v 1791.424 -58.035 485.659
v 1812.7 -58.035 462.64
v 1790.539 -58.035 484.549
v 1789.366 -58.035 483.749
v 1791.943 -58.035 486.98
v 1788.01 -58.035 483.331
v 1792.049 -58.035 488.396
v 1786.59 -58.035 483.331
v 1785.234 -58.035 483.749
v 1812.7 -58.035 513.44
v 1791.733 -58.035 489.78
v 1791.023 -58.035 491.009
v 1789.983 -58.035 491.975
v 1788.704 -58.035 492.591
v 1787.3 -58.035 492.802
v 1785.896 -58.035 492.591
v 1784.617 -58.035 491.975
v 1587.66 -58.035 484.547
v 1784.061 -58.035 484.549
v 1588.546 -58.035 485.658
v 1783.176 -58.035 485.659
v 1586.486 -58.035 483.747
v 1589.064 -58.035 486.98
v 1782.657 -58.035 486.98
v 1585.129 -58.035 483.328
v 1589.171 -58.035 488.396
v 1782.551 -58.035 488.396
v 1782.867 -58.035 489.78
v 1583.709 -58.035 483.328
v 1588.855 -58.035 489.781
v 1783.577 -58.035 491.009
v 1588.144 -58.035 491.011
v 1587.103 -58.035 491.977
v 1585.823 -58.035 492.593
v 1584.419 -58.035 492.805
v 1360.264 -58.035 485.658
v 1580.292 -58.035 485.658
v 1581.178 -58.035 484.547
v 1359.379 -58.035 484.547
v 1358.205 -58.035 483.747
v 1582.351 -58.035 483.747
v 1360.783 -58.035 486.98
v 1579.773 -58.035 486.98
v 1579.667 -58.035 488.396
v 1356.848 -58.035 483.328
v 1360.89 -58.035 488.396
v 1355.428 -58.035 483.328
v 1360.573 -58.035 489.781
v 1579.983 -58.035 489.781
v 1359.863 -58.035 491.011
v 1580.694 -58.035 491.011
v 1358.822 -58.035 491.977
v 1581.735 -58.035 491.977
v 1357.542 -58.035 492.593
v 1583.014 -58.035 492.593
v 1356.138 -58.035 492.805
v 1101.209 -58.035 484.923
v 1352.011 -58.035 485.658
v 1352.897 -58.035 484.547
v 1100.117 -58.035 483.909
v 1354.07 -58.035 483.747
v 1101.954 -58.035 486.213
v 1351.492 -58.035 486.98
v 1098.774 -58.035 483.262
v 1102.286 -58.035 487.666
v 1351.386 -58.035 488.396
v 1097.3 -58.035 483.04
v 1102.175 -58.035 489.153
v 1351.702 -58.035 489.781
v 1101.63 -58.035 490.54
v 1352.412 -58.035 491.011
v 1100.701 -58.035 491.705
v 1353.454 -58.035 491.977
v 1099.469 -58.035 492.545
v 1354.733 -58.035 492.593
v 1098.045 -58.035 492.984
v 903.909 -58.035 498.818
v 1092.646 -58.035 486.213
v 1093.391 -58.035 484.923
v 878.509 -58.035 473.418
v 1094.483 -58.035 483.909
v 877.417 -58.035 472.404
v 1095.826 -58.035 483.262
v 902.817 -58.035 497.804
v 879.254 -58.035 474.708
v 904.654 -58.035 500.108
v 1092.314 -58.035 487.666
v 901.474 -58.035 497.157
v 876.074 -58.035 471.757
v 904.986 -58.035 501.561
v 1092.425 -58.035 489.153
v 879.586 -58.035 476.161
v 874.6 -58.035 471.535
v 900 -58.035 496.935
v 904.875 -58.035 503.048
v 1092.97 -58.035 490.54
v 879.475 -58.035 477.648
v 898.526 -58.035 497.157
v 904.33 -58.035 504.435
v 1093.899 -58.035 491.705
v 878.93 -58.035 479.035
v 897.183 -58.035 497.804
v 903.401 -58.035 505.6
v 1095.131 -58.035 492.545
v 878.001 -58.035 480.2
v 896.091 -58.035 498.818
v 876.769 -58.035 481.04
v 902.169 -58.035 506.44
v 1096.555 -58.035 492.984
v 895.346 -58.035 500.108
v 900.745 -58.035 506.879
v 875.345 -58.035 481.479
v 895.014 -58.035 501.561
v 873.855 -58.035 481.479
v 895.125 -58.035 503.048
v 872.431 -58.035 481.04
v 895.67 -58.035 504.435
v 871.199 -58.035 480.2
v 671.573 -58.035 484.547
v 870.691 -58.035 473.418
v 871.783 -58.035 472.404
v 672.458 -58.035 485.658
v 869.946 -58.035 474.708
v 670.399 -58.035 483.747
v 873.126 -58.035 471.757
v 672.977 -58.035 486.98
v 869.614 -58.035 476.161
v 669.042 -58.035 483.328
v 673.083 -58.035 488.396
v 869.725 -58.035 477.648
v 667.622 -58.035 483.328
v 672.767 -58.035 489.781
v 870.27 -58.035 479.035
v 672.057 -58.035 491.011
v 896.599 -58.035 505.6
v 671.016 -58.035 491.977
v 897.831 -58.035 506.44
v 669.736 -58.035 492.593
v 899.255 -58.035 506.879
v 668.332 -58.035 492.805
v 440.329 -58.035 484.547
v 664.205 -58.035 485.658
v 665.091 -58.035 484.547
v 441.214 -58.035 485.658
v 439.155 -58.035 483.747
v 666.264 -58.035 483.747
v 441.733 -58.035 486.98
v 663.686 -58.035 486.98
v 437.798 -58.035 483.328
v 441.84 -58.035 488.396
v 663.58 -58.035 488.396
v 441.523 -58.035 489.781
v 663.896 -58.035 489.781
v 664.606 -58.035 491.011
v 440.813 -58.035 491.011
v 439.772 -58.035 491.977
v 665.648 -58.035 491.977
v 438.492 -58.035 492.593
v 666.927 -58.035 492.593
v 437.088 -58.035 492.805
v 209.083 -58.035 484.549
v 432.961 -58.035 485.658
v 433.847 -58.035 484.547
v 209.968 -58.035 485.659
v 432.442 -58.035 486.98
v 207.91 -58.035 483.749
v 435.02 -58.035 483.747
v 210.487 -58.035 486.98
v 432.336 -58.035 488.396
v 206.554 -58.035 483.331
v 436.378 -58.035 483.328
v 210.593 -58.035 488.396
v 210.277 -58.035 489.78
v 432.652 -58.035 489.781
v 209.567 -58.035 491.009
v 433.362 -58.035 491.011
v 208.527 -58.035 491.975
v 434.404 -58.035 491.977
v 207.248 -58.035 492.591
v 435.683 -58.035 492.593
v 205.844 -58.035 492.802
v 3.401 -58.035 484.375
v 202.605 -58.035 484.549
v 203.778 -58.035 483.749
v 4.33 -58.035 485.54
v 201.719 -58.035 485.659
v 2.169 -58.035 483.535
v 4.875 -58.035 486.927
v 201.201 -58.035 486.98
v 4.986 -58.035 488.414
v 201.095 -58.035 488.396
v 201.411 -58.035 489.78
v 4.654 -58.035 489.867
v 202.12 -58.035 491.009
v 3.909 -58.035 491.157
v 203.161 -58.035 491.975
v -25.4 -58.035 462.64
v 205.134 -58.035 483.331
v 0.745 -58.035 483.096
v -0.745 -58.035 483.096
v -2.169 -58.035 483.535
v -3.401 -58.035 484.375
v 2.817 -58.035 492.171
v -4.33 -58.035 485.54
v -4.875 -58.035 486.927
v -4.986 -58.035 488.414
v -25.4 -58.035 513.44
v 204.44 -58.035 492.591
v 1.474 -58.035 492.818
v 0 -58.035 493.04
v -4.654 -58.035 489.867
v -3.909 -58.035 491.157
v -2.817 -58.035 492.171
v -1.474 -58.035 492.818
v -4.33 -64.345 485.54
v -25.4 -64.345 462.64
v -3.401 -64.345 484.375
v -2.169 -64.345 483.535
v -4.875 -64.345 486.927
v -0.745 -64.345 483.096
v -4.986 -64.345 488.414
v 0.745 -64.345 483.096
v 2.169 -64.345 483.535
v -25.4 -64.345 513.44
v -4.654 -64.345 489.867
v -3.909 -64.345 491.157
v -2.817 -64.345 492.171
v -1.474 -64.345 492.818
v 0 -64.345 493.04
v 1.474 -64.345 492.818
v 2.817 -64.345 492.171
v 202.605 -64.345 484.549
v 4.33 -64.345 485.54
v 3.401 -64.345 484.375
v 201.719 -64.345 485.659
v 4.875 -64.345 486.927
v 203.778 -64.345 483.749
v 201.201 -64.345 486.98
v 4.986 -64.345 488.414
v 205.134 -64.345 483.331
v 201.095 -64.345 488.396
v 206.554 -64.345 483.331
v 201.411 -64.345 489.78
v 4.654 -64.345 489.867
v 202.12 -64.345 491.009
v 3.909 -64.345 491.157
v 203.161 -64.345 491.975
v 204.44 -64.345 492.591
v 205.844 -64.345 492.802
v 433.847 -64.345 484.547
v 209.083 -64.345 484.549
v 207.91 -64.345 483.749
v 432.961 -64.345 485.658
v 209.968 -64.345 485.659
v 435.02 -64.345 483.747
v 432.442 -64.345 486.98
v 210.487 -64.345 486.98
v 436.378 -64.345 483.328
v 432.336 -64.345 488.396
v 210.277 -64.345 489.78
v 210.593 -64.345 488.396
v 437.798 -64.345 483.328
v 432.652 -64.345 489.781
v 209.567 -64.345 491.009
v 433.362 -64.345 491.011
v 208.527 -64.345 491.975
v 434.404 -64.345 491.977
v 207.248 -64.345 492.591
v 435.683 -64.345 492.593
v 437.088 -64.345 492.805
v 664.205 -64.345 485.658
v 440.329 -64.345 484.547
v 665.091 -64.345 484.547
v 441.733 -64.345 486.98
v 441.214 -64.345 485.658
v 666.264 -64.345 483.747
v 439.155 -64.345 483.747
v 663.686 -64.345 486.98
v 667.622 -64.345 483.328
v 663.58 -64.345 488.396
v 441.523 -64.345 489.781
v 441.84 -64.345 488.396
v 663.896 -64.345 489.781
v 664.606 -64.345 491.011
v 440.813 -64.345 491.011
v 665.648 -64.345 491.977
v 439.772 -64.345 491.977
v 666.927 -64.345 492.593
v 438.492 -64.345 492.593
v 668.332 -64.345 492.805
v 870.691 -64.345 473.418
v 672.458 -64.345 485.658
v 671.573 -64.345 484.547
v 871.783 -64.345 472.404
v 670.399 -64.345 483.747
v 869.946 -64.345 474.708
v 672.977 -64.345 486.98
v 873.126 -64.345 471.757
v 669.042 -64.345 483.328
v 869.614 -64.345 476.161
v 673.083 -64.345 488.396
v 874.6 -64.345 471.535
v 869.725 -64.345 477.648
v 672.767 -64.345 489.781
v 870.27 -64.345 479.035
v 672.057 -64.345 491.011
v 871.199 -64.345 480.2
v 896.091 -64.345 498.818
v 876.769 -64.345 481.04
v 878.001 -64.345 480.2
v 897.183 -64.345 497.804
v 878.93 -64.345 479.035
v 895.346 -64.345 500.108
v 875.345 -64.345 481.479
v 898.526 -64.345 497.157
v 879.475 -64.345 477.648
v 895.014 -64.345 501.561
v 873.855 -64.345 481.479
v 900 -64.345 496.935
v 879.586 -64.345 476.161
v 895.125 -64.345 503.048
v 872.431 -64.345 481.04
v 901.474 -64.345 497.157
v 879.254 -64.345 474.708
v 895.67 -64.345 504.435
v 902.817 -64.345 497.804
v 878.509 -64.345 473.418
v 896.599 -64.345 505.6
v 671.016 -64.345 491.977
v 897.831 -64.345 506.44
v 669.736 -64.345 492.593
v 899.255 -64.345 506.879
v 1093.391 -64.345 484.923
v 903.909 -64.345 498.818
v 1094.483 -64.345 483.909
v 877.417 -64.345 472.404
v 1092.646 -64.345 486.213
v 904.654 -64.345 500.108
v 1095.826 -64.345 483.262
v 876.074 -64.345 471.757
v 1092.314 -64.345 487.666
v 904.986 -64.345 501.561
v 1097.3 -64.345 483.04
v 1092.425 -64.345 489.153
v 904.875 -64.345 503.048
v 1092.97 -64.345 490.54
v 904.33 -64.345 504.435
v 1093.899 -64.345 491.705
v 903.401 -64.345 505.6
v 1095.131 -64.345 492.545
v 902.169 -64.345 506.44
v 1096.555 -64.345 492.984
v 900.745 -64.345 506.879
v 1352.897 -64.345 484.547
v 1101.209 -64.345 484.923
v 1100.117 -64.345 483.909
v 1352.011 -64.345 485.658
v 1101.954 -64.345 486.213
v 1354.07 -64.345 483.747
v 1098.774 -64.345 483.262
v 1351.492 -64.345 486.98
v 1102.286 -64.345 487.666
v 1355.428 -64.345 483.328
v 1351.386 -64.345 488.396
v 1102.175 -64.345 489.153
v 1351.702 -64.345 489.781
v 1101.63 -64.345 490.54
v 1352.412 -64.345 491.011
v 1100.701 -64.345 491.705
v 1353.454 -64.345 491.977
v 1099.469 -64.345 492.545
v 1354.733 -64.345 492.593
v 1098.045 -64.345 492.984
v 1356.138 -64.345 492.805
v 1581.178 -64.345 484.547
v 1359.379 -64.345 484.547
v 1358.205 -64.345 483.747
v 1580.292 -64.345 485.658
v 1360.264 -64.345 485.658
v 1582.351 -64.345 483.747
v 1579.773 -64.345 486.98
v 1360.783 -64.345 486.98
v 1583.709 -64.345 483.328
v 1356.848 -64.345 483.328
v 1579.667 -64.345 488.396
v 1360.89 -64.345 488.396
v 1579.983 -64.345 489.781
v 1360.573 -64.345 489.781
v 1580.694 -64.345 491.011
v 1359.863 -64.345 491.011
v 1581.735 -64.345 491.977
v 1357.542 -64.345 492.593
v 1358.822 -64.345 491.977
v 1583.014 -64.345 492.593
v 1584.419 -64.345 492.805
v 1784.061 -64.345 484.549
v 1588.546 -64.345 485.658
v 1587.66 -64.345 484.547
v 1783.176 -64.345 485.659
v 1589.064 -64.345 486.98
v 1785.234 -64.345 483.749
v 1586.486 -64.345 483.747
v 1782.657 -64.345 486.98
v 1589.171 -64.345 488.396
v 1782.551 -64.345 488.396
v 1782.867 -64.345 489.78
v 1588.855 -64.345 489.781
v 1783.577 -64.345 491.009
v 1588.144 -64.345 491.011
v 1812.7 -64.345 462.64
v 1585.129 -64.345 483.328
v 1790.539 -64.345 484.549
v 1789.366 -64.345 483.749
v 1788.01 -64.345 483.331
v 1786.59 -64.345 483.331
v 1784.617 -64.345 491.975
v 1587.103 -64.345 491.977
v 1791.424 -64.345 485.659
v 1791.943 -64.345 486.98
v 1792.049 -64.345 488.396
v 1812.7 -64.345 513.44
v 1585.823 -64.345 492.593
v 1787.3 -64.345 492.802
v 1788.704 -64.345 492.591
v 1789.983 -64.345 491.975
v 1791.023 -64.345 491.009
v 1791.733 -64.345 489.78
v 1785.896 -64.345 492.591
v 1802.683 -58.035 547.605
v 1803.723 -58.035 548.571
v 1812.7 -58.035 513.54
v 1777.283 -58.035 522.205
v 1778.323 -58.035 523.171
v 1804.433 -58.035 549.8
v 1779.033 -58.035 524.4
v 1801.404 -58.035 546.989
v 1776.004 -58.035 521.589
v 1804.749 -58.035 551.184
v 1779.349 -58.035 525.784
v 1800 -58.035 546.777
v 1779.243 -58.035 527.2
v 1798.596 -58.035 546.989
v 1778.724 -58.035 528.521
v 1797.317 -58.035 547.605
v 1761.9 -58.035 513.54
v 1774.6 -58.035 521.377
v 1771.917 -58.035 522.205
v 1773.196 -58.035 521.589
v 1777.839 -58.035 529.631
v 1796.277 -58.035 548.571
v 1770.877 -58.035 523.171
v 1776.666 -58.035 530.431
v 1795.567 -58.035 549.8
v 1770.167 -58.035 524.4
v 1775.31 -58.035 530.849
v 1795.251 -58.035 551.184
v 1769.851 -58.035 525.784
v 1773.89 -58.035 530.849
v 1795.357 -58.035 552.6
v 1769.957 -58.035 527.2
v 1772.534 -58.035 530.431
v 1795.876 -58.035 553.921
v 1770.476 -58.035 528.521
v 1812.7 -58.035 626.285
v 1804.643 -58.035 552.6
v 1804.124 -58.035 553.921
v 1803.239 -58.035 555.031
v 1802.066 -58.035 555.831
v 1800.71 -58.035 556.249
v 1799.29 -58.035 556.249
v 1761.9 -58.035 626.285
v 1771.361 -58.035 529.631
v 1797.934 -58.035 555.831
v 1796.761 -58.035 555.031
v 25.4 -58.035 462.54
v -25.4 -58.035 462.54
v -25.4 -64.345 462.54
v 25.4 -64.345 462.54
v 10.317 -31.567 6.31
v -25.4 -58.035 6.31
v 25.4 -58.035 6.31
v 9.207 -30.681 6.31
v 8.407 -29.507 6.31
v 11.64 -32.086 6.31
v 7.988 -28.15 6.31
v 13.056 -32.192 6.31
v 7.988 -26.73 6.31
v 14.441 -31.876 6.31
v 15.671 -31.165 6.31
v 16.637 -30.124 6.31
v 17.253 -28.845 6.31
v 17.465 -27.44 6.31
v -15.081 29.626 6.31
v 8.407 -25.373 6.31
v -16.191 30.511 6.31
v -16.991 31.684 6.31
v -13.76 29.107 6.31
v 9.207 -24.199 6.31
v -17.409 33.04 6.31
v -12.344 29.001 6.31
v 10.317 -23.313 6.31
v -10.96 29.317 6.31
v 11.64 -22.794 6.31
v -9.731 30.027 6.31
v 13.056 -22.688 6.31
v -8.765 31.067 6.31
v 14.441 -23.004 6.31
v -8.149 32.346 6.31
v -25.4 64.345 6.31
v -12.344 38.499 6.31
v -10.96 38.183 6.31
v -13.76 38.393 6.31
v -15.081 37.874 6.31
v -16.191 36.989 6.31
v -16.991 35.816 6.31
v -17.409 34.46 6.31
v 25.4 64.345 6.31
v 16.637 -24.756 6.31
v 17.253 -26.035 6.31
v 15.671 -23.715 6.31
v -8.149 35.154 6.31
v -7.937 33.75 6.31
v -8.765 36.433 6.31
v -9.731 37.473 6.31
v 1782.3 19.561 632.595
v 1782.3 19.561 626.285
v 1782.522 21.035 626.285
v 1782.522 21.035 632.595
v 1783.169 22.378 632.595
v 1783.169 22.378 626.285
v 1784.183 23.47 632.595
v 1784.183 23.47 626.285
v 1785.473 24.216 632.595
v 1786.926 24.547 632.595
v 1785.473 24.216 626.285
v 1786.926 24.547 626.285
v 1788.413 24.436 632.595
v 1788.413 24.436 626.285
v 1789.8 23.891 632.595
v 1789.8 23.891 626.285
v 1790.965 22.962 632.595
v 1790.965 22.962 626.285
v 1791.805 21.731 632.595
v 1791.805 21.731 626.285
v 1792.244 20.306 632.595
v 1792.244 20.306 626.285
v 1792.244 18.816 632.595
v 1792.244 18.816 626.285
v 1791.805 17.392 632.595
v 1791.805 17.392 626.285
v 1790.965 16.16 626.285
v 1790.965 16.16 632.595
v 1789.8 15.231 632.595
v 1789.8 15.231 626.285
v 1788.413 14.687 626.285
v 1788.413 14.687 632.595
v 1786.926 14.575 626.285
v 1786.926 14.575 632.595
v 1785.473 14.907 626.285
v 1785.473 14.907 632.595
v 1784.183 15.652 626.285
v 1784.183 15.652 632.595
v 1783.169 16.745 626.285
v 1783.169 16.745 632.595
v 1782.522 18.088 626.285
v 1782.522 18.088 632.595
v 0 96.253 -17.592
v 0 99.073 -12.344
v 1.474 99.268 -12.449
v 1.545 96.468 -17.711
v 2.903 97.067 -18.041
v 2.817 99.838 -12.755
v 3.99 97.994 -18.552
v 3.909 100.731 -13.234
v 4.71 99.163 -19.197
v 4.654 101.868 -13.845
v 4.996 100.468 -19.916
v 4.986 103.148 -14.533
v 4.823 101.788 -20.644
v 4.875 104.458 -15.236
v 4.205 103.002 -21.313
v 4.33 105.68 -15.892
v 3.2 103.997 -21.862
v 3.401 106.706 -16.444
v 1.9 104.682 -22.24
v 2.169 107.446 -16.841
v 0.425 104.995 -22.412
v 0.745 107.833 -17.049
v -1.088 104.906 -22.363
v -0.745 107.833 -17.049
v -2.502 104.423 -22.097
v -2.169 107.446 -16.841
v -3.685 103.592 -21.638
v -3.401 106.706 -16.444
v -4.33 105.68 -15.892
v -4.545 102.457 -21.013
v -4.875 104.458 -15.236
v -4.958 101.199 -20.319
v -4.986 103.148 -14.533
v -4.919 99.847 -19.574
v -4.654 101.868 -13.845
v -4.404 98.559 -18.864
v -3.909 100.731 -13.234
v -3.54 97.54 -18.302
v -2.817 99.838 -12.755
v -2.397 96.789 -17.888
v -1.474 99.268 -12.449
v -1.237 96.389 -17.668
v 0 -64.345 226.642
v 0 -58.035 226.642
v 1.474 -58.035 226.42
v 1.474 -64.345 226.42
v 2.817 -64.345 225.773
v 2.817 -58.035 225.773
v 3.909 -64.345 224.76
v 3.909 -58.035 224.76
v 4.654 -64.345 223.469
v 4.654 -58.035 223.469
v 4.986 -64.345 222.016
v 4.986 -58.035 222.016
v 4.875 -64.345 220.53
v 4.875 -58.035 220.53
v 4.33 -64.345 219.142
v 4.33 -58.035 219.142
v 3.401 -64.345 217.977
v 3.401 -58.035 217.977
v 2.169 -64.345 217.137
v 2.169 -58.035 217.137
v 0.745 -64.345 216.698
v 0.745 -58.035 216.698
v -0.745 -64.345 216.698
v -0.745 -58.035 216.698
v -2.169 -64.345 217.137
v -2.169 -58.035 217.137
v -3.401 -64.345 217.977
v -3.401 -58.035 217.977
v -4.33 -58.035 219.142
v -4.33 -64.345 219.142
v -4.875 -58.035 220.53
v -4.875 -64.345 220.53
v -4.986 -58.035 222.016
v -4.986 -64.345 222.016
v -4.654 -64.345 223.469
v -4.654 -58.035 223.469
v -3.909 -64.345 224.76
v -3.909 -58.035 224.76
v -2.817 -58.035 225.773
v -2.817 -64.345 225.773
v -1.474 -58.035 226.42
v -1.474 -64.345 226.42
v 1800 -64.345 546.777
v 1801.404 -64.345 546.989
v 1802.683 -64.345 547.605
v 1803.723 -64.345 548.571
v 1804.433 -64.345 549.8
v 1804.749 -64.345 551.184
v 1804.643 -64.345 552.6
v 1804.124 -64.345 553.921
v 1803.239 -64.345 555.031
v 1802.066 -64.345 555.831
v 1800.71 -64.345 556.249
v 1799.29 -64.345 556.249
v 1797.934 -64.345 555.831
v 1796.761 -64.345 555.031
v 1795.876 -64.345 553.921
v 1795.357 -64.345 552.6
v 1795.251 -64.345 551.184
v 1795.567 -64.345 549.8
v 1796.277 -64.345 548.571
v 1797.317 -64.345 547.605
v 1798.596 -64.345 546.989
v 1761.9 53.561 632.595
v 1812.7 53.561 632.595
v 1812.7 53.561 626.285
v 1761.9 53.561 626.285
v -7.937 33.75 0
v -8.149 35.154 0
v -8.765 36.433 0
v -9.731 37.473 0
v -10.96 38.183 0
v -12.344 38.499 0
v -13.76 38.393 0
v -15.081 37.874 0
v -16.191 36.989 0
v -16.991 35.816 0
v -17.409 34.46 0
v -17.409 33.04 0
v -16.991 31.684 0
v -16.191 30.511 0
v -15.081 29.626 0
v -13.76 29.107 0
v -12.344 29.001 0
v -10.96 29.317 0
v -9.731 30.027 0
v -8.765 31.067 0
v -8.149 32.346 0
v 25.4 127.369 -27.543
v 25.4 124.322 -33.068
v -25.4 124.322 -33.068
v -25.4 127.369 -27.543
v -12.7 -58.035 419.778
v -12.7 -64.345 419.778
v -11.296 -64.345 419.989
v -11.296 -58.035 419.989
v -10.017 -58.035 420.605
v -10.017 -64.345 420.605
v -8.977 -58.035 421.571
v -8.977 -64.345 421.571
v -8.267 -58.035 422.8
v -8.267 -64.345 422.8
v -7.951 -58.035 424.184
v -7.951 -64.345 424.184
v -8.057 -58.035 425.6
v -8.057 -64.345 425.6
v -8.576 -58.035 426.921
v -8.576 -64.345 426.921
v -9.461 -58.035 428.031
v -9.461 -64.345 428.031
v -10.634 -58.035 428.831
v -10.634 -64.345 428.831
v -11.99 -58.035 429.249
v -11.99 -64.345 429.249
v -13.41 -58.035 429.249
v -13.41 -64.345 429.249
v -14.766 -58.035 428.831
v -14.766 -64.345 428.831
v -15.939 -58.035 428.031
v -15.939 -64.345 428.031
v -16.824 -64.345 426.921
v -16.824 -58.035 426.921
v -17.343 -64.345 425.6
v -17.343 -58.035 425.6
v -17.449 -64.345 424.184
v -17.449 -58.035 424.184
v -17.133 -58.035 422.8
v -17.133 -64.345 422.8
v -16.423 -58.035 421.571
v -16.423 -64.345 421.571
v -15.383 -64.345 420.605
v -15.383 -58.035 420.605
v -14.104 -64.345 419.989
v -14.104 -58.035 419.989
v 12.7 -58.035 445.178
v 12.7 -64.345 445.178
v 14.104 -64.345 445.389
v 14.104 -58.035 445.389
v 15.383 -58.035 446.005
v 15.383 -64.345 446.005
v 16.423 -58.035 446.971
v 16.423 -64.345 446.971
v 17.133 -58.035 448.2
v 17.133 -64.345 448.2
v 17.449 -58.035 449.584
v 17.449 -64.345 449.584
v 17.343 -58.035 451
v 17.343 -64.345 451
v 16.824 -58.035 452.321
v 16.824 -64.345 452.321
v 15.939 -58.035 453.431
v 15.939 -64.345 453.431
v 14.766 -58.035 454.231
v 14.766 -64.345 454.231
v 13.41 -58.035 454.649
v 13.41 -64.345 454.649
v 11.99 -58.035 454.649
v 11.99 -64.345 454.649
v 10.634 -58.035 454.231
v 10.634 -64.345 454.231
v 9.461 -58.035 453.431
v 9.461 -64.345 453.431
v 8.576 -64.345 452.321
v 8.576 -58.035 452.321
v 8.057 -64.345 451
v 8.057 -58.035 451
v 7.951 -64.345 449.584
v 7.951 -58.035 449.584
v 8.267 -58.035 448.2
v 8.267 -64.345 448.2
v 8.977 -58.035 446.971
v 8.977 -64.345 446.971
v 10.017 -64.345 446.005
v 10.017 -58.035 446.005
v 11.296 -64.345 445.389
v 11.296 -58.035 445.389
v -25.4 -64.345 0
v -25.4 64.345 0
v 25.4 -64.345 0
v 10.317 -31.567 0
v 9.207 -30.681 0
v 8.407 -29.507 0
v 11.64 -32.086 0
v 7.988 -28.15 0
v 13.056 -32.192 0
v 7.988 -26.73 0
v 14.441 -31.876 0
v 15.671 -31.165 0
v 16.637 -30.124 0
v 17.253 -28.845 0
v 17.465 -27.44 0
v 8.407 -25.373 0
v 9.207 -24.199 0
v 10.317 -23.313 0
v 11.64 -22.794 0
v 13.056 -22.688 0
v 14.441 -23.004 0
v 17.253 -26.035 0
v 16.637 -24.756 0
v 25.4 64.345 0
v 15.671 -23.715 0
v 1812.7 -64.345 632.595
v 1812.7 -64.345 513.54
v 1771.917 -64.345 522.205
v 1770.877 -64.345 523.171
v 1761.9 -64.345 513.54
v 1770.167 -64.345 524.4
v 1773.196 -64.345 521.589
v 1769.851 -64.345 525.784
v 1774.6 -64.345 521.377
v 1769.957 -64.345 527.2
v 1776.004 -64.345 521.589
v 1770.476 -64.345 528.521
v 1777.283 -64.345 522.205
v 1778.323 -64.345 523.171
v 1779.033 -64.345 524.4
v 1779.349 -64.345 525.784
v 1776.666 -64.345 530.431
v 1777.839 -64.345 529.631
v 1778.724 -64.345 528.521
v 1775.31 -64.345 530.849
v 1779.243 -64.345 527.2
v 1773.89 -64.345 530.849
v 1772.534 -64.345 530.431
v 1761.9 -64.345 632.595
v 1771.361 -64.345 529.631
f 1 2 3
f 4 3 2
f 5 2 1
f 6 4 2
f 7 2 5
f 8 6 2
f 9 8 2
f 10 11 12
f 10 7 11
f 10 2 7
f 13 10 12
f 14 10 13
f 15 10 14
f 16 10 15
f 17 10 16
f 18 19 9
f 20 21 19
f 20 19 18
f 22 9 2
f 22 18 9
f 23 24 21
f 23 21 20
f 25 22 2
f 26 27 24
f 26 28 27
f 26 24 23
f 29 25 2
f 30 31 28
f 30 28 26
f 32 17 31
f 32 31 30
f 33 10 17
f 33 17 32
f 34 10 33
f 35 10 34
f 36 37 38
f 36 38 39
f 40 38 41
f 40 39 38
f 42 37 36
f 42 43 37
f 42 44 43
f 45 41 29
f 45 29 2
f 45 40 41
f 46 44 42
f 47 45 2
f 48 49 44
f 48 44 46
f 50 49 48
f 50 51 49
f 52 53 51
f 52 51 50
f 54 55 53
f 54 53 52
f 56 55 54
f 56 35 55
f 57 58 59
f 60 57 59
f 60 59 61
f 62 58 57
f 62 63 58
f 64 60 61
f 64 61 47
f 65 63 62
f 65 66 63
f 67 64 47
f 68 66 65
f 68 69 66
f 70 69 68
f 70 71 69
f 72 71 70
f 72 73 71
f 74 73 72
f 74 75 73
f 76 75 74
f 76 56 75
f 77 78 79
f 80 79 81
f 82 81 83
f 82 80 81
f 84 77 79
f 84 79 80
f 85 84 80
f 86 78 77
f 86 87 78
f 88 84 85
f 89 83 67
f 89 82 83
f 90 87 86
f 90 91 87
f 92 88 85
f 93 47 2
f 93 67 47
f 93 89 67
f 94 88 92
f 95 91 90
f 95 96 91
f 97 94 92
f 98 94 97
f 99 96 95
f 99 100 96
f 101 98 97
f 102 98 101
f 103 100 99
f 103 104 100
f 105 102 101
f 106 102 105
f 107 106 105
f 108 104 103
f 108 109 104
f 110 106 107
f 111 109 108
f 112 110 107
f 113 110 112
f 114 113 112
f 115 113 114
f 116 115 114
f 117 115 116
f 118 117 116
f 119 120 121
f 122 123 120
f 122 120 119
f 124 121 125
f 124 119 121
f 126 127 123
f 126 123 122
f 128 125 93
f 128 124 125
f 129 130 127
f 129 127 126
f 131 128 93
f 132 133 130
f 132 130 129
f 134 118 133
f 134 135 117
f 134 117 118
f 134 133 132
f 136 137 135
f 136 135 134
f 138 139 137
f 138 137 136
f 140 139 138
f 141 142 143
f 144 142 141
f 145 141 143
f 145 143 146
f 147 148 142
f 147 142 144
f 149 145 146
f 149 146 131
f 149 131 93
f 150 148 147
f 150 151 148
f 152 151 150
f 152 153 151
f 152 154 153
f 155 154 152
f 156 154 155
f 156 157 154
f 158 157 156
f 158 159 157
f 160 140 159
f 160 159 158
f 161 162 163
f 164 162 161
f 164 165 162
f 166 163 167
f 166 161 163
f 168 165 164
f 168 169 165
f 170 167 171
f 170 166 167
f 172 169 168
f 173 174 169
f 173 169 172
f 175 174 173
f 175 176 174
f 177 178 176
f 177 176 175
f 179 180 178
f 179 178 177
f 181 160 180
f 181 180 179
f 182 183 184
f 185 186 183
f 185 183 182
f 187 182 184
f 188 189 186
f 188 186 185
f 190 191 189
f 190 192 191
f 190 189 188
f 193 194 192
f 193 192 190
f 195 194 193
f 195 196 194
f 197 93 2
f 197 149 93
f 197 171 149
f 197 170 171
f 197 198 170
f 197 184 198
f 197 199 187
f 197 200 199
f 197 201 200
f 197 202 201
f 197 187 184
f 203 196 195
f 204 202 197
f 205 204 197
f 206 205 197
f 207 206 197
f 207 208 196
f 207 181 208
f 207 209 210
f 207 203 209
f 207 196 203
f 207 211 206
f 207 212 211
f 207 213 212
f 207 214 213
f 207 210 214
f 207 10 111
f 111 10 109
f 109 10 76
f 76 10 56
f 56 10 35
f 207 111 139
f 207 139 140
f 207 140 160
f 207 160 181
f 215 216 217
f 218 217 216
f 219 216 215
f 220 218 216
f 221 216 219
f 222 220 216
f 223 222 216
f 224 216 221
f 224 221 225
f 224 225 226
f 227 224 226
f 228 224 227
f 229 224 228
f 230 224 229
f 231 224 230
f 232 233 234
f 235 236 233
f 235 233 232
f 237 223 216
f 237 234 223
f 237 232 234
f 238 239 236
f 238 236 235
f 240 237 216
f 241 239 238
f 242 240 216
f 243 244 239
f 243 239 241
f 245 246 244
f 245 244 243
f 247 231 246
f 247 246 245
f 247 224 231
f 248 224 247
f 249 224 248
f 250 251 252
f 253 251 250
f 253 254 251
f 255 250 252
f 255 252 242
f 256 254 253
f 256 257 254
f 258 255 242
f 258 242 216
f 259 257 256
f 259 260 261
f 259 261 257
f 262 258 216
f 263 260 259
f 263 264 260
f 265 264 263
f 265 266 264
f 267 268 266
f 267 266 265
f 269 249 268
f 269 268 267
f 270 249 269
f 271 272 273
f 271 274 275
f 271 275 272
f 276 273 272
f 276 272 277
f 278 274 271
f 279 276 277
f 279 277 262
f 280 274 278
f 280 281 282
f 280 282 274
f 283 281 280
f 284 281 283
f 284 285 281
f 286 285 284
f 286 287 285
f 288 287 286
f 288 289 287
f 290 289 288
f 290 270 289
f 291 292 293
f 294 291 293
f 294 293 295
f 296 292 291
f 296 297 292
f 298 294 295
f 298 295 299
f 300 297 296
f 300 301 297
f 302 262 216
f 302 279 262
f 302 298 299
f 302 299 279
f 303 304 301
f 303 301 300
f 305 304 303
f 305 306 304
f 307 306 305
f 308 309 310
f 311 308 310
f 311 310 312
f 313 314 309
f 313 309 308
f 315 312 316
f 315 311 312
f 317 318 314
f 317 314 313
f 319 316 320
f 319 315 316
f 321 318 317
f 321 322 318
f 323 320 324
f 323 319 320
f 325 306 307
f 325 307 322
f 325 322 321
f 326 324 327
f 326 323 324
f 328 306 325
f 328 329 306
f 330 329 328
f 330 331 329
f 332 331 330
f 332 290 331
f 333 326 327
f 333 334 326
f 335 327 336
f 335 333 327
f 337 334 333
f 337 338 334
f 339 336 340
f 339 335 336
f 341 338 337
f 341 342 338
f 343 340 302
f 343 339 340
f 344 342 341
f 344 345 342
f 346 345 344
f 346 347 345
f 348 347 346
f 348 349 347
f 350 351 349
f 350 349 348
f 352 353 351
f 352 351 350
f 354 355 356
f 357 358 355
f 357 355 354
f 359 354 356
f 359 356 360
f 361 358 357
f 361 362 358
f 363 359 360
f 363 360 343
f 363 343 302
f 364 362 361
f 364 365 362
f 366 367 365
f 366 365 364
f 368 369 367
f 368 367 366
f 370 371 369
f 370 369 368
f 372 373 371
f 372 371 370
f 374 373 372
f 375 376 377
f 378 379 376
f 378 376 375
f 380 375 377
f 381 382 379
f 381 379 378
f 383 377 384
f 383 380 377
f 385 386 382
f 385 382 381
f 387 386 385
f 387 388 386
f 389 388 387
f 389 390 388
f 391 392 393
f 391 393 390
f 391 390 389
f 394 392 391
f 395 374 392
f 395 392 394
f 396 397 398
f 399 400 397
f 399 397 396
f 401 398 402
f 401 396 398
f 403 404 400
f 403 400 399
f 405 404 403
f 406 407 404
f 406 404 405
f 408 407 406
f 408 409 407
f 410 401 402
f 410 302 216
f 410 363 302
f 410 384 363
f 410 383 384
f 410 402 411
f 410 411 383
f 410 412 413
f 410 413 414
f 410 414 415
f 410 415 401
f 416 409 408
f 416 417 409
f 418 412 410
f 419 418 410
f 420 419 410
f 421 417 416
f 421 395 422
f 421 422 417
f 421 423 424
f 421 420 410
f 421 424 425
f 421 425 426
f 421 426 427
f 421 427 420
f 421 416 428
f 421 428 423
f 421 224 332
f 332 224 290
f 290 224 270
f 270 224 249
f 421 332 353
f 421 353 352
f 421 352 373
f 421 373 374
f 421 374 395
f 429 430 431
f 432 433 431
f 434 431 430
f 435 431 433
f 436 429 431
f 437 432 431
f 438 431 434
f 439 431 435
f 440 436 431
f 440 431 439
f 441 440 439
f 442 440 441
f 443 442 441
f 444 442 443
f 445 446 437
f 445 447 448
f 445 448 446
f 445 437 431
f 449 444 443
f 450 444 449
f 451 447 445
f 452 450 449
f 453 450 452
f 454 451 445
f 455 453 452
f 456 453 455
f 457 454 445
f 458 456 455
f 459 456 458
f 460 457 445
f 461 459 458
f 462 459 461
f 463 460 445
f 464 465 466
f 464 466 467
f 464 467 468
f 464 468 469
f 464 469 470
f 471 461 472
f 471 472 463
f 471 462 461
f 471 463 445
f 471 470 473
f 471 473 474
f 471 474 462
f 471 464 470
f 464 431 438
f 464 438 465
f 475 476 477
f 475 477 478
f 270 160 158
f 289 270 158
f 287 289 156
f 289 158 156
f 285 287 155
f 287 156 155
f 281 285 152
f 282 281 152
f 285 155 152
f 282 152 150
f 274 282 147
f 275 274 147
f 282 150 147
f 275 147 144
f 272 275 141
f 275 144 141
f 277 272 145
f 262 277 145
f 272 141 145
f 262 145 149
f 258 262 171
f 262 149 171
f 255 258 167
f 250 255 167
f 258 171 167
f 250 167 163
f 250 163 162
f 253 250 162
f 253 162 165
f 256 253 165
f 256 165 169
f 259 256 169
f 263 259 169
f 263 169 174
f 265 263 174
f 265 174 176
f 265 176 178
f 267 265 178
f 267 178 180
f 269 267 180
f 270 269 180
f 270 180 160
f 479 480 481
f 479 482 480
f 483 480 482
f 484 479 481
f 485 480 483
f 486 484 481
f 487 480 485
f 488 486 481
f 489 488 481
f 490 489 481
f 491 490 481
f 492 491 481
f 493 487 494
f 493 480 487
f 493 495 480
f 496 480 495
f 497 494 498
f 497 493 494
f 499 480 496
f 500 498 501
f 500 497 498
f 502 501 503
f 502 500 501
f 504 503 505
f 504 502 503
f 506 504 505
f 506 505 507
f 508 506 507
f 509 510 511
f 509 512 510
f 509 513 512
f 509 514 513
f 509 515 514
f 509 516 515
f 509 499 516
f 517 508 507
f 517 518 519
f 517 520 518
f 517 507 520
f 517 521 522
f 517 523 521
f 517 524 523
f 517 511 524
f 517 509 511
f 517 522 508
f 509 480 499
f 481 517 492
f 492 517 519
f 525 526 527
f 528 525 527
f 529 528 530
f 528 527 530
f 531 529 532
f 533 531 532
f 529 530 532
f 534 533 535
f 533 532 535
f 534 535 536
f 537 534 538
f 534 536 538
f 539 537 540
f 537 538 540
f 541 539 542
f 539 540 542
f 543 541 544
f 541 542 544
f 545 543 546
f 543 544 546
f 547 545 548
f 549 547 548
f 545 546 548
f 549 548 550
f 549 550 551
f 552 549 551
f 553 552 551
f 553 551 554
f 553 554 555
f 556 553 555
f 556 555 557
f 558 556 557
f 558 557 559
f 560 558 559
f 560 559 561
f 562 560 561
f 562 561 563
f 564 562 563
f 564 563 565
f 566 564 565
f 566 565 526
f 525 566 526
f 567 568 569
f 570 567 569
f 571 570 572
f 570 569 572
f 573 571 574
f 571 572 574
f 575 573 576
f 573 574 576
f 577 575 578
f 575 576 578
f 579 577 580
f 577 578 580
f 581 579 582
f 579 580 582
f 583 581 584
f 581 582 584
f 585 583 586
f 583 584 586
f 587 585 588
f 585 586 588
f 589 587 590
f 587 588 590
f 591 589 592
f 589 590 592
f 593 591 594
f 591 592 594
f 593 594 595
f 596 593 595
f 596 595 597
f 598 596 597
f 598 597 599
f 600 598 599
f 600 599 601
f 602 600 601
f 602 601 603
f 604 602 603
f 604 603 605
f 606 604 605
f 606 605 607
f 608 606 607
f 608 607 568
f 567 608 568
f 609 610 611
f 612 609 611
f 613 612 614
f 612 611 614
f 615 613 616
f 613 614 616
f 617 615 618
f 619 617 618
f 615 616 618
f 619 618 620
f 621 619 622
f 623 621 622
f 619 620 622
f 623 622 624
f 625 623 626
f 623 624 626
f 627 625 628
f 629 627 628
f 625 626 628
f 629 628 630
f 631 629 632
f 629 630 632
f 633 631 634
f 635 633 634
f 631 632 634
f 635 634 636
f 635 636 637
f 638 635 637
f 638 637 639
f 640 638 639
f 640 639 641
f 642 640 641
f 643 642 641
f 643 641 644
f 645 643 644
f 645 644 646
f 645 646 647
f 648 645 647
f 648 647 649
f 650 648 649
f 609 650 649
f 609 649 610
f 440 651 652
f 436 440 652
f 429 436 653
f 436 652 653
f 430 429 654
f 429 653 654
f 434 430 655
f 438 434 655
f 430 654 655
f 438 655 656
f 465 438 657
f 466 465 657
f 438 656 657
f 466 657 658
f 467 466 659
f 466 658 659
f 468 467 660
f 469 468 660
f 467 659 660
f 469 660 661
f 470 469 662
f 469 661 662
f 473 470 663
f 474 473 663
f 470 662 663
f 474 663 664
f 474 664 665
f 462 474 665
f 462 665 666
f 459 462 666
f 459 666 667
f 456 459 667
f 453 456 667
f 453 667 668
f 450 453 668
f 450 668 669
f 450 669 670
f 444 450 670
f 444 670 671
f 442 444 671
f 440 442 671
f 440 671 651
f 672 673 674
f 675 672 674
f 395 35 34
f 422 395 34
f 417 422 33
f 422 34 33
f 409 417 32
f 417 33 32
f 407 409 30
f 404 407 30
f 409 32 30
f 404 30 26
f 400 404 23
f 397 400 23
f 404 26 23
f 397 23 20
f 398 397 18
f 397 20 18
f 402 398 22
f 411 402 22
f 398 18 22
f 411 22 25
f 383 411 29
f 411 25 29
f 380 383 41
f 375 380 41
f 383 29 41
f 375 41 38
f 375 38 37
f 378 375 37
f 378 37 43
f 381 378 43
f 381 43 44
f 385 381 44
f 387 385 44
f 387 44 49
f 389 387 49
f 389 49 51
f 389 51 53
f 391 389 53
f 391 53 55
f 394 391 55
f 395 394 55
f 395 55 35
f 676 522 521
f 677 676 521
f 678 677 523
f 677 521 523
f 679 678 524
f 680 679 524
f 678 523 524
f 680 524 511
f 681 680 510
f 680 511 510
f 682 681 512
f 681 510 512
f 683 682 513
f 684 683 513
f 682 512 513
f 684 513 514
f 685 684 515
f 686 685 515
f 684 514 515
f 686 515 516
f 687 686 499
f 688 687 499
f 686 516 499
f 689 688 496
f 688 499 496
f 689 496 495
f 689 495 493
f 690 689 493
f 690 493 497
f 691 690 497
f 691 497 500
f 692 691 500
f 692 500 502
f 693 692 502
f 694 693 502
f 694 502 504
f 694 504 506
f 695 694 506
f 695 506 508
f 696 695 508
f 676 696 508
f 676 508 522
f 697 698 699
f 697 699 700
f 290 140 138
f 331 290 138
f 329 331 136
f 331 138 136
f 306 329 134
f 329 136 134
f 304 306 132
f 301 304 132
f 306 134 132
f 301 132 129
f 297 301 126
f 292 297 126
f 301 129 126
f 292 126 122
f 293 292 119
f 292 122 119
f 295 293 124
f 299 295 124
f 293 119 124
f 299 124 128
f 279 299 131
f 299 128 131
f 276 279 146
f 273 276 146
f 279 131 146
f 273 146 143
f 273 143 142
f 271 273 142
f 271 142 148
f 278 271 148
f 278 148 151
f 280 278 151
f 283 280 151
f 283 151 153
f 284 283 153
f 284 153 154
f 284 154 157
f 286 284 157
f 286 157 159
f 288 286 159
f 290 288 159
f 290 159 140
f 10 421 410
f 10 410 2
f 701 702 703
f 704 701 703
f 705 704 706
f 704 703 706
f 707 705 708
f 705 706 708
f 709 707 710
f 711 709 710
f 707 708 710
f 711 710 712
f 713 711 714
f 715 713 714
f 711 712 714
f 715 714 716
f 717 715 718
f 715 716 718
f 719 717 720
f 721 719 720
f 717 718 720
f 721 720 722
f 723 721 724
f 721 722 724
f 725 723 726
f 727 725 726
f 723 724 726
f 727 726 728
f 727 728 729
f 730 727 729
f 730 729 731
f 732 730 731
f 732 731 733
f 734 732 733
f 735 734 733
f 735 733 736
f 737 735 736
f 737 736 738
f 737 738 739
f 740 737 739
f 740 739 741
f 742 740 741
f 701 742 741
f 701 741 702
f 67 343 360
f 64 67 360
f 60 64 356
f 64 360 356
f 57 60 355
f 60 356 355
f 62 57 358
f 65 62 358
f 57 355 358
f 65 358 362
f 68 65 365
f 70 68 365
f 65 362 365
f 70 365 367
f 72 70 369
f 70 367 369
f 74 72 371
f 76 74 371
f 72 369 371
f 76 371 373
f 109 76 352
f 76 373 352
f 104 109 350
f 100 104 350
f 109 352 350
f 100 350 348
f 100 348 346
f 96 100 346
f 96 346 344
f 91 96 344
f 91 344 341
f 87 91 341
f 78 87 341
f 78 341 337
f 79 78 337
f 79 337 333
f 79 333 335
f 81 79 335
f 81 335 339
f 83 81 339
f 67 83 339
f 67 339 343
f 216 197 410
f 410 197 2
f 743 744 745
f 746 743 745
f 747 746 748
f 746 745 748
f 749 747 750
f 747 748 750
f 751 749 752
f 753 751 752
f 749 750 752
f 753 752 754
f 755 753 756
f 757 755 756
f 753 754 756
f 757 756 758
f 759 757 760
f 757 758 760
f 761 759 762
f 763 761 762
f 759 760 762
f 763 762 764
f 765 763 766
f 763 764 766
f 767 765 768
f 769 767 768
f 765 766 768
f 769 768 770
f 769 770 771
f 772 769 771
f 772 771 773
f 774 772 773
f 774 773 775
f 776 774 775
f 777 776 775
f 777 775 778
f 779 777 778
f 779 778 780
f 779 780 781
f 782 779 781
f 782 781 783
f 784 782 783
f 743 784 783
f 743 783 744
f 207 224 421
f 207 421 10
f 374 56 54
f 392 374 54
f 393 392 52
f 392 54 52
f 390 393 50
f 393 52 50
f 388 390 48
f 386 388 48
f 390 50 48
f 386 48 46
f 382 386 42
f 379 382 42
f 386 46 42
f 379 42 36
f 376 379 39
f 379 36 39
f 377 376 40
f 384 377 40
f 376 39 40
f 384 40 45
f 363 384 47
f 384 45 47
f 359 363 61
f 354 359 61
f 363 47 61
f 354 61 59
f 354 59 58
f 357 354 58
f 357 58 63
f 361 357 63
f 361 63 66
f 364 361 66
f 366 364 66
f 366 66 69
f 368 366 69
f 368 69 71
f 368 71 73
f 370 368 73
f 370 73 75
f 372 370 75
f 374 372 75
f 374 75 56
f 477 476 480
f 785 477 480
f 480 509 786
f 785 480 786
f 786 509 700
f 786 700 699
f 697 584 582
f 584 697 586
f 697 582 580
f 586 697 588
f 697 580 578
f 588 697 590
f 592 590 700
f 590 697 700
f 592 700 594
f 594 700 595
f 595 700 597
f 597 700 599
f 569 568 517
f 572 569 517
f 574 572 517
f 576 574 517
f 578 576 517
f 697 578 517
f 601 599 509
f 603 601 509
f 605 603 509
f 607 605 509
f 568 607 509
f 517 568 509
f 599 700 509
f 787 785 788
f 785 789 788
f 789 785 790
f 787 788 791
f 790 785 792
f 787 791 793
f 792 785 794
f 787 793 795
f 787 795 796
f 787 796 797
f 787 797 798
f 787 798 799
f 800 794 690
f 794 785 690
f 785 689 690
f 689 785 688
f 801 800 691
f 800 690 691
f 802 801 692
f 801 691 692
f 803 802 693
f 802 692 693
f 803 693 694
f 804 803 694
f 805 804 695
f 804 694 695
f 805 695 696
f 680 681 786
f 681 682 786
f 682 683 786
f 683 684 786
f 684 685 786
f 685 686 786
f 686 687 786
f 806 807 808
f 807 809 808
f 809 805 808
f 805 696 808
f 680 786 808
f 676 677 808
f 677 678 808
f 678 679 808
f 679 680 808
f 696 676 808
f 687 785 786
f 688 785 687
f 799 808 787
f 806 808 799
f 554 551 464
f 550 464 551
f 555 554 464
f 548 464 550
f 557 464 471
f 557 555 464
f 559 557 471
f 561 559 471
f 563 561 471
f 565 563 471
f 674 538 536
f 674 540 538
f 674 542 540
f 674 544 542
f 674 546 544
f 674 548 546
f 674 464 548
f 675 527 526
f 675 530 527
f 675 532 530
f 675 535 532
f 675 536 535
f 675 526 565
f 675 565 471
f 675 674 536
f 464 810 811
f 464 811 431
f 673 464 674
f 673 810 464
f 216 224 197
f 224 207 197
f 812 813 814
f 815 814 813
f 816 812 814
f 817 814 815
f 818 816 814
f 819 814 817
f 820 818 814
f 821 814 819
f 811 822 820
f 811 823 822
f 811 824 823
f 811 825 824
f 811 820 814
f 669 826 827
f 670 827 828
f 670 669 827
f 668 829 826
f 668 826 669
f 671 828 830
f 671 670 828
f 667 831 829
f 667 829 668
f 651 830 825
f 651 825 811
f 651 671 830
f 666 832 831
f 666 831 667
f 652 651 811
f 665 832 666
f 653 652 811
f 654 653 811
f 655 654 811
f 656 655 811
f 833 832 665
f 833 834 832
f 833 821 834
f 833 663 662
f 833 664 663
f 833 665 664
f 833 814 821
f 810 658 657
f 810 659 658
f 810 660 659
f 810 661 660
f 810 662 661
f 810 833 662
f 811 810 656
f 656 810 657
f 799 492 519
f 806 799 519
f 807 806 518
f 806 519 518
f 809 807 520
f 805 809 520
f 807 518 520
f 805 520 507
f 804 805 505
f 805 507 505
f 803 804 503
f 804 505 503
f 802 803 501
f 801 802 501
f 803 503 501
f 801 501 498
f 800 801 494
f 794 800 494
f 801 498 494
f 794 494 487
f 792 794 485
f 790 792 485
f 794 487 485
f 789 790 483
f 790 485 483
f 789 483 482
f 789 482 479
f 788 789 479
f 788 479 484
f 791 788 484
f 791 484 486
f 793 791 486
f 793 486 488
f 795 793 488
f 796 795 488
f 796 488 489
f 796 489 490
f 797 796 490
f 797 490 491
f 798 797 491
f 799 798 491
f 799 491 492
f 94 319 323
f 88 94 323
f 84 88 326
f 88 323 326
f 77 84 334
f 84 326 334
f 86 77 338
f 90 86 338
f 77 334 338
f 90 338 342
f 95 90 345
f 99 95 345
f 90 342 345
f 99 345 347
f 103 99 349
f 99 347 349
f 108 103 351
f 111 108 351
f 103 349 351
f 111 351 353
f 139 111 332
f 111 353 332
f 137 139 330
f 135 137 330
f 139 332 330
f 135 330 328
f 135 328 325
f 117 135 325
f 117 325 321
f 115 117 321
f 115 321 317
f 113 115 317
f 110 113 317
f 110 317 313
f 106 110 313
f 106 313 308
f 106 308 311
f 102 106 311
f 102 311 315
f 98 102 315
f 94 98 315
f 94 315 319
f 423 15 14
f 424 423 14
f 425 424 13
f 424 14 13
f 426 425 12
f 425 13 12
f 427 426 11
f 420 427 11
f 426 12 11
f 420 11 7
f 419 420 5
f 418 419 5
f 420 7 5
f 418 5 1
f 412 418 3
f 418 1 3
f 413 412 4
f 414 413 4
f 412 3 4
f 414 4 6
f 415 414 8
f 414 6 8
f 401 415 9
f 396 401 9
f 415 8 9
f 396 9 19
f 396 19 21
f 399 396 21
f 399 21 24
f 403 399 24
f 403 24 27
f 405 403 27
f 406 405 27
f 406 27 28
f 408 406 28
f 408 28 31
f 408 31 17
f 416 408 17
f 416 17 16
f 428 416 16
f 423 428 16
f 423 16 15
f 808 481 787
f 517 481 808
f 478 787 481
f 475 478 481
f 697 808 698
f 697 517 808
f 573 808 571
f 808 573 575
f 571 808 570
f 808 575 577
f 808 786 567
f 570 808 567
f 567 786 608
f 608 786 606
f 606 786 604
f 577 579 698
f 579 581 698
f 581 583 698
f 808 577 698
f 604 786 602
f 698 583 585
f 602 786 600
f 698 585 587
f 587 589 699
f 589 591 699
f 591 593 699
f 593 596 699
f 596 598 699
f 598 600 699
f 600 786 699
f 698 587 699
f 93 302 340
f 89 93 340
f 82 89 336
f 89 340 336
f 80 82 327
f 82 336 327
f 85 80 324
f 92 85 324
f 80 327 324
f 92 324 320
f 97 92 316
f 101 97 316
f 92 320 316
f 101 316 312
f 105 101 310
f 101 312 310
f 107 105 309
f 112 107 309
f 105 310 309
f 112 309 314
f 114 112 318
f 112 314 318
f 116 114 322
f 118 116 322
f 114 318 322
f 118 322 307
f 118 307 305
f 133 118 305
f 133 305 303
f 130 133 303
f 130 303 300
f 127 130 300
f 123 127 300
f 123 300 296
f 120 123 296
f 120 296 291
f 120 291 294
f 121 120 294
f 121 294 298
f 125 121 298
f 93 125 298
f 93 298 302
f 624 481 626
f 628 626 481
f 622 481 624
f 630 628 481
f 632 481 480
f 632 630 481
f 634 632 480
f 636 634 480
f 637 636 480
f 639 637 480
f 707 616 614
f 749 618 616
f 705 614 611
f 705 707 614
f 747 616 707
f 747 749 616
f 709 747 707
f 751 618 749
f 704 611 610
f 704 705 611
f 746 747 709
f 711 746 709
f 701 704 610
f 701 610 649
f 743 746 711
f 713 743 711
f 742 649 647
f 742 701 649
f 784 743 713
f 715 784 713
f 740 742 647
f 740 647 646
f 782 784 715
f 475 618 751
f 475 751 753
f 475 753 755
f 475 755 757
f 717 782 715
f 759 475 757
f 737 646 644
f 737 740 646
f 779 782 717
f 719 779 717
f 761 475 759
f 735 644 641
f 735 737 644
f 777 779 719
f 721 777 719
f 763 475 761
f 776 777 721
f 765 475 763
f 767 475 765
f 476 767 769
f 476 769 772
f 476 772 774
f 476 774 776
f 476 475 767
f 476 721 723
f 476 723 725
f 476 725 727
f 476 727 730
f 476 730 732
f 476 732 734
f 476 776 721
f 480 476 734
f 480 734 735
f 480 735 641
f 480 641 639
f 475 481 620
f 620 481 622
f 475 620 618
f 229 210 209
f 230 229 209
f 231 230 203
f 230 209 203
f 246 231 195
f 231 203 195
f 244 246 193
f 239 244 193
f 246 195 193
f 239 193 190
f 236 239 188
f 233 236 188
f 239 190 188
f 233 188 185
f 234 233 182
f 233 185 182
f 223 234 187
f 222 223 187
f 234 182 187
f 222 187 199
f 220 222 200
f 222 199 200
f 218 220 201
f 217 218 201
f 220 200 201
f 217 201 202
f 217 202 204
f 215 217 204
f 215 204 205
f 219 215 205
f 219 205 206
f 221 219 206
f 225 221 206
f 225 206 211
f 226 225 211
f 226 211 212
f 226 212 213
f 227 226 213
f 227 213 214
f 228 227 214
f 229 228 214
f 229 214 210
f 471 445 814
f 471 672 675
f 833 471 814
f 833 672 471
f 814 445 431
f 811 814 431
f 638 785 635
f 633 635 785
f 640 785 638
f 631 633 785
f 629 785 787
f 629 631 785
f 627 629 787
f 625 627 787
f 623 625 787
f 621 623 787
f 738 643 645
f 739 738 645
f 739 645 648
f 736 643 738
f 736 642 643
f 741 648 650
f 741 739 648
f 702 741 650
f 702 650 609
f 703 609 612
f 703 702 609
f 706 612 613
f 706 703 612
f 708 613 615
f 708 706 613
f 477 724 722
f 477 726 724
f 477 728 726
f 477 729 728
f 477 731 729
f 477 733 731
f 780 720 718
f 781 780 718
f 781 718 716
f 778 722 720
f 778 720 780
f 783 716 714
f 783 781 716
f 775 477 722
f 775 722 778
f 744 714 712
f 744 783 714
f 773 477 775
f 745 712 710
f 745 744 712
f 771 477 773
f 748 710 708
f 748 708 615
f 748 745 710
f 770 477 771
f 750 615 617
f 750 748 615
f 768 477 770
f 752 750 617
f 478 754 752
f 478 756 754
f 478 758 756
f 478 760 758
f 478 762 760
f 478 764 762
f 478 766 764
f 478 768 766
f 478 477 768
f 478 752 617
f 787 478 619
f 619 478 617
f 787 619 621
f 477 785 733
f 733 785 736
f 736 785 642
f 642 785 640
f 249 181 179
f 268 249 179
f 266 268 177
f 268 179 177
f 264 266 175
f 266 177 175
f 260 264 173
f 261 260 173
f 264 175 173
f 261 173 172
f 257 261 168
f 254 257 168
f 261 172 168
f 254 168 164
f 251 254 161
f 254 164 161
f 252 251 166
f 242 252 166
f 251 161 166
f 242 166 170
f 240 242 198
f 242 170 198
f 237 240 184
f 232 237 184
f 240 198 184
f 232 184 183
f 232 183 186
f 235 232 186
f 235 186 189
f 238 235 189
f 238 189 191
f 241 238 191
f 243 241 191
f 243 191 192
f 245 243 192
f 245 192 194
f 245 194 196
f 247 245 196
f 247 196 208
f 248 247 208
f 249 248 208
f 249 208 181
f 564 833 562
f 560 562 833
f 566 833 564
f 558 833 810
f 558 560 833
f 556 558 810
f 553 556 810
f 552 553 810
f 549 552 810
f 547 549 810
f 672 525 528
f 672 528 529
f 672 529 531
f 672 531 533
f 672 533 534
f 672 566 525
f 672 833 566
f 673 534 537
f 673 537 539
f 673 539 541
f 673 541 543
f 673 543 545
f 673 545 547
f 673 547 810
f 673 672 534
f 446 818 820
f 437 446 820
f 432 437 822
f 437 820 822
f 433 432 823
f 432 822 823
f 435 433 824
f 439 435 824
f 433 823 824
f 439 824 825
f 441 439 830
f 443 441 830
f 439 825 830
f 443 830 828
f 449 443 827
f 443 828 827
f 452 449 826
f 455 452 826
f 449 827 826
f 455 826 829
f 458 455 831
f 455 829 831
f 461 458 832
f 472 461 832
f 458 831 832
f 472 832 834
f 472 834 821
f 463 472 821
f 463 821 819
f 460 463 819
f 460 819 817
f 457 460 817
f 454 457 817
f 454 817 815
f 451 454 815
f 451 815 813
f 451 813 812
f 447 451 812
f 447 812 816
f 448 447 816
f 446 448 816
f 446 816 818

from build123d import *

# Parameters (mm, degrees)
CROQUIS2_W              = 50.8
CROQUIS2_H              = 128.69
SALIENTE_EXTRUIR1_DEPTH = 6.31
CROQUIS3_W              = 50.8
CROQUIS3_H              = 6.31
SALIENTE_EXTRUIR2_DEPTH = 507.13
CROQUIS4_W              = 50.8
CROQUIS4_H              = 6.31
SALIENTE_EXTRUIR3_DEPTH = 1787.3
CROQUIS9_W              = 50.8
CROQUIS9_H              = 6.31
SALIENTE_EXTRUIR4_DEPTH = 98
CROQUIS12_R             = 5
CORTAR_EXTRUIR1_DEPTH   = 10
CORTAR_EXTRUIR2_DEPTH   = 73
CROQUIS16_W             = 47.2
CROQUIS16_H             = 71.54029971
CORTAR_EXTRUIR5_DEPTH   = 10
CROQUIS21_R             = 5
CORTAR_EXTRUIR11_DEPTH  = 10
CROQUIS25_W             = 50.8
CROQUIS25_H             = 0.1
CORTAR_EXTRUIR14_DEPTH  = 50.8
CROQUIS24_W             = 50.8
CROQUIS24_H             = 0.1
CORTAR_EXTRUIR15_DEPTH  = 50.8
CROQUIS26_R             = 4.7625
CORTAR_EXTRUIR16_DEPTH  = 33
CROQUIS27_R             = 5
CORTAR_EXTRUIR17_DEPTH  = 33
CROQUIS28_R             = 5
CORTAR_EXTRUIR18_DEPTH  = 10
CROQUIS29_R             = 4.7625
CORTAR_EXTRUIR19_DEPTH  = 10
CROQUIS30_R             = 4.7625
CORTAR_EXTRUIR20_DEPTH  = 50
CROQUIS31_R             = 5
CORTAR_EXTRUIR21_DEPTH  = 50
CROQUIS32_R             = 5
CORTAR_EXTRUIR22_DEPTH  = 50
CROQUIS33_R             = 5
CORTAR_EXTRUIR23_DEPTH  = 50
CROQUIS34_R             = 4.765
CROQUIS34_R_2           = 4.7625
CORTAR_EXTRUIR24_DEPTH  = 10
CROQUIS35_R             = 4.765
CROQUIS35_R_2           = 4.7625
CORTAR_EXTRUIR25_DEPTH  = 10


with BuildPart() as part:
    # Croquis2 → Saliente-Extruir1 (new body)
    with BuildSketch(Plane.XY):
        Rectangle(CROQUIS2_W, CROQUIS2_H)
    extrude(amount=SALIENTE_EXTRUIR1_DEPTH)

    # Croquis3 → Saliente-Extruir2 (add)
    with BuildSketch(Plane.XY.offset(6.31)):
        with Locations((0, -61.19)):
            Rectangle(CROQUIS3_W, CROQUIS3_H)
    extrude(amount=SALIENTE_EXTRUIR2_DEPTH)

    # Croquis4 → Saliente-Extruir3 (add)
    with BuildSketch(Plane(origin=(25.4, 0, 0), x_dir=(0, 0, -1), z_dir=(1, 0, 0))):
        with Locations((-488.04, -61.19)):
            Rectangle(CROQUIS4_W, CROQUIS4_H)
    extrude(amount=SALIENTE_EXTRUIR3_DEPTH)

    # Barrer2: sweep along a curve in space
    with BuildLine() as barrer2_path:
        Line((1787.3, -61.19, 513.44), (1787.3, -61.19, 629.44))
        Line((1787.3, -61.19, 629.44), (1787.3, 63.52, 629.44))
        Line((1787.3, 63.52, 629.44), (1787.3, 63.52, 1423.44))
    # Croquis9 → Barrer2 (sweep)
    with BuildSketch(Plane.XY.offset(513.44)):
        with Locations((1787.3, -61.19)):
            Rectangle(CROQUIS9_W, CROQUIS9_H)
    sweep(path=barrer2_path.line, transition=Transition.RIGHT)

    # Croquis11 → Saliente-Extruir4 (add)
    with BuildSketch(Plane.ZY.offset(25.4)):
        Polygon((0, 64.345), (-33.068312374, 124.322347428), (-27.542535245, 127.368966394), (6.31, 64.345), align=None)
    extrude(amount=-SALIENTE_EXTRUIR4_DEPTH)

    # Croquis12 → Cortar-Extruir1 (cut)
    with BuildSketch(Plane(origin=(0, 66.675, 0), x_dir=(1, 0, 0), z_dir=(0, 1, 0))):
        with Locations(Location((1787.3, -1390.44, 0), (0, 0, 270))):
            Circle(CROQUIS12_R)
        with Locations(Location((1787.3, -1170.44, 0), (0, 0, 270))):
            Circle(CROQUIS12_R)
    extrude(amount=-CORTAR_EXTRUIR1_DEPTH, mode=Mode.SUBTRACT)

    # Croquis13 → Cortar-Extruir2 (cut)
    with BuildSketch(Plane(origin=(1812.7, 0, 0), x_dir=(0, 0, -1), z_dir=(1, 0, 0))):
        Polygon((-632.595, 53.56128726), (-626.285, 53.56128726), (-626.285, 66.675), (-1423.44, 66.675), (-1423.44, 60.365), (-632.595, 60.365), align=None)
    extrude(amount=-CORTAR_EXTRUIR2_DEPTH, mode=Mode.SUBTRACT)

    # Croquis16 → Cortar-Extruir5 (cut)
    with BuildSketch(Plane(origin=(0, 17.038152429, 31.720281459), x_dir=(1, 0, 0), z_dir=(0, 0.4731953232328629, 0.880957539311939))):
        with Locations((49, 89.469500232)):
            Rectangle(CROQUIS16_W, CROQUIS16_H)
    extrude(amount=-CORTAR_EXTRUIR5_DEPTH, mode=Mode.SUBTRACT)

    # Croquis21 → Cortar-Extruir11 (cut)
    with BuildSketch(Plane(origin=(0, -58.035, 0), x_dir=(1, 0, 0), z_dir=(0, 1, 0))):
        with Locations(Location((0, -221.642204666, 0), (0, 0, 270))):
            Circle(CROQUIS21_R)
    extrude(amount=-CORTAR_EXTRUIR11_DEPTH, mode=Mode.SUBTRACT)

    # Croquis25 → Cortar-Extruir14 (cut)
    with BuildSketch(Plane(origin=(0, -58.035, 0), x_dir=(1, 0, 0), z_dir=(0, 1, 0))):
        with Locations((1787.3, -513.49)):
            Rectangle(CROQUIS25_W, CROQUIS25_H)
    extrude(amount=-CORTAR_EXTRUIR14_DEPTH, mode=Mode.SUBTRACT)


with BuildPart() as cortar_extruir14_piece_1:
    # of the separate pieces the step leaves, piece 1, a body of its own (cortar_extruir14_pieces)
    add(part.part.solids().sort_by_distance((-25.4, -58.035, 6.31))[0])

    # Croquis24 → Cortar-Extruir15 (cut)
    with BuildSketch(Plane(origin=(0, -58.035, 0), x_dir=(1, 0, 0), z_dir=(0, 1, 0))):
        with Locations((0, -462.59)):
            Rectangle(CROQUIS24_W, CROQUIS24_H)
    extrude(amount=-CORTAR_EXTRUIR15_DEPTH, mode=Mode.SUBTRACT)


with BuildPart() as cortar_extruir14_piece_2:
    # of the separate pieces the step leaves, piece 2, a body of its own (cortar_extruir14_pieces)
    add(part.part.solids().sort_by_distance((1812.7, -58.035, 513.54))[0])

    # Croquis27 → Cortar-Extruir17 (cut)
    with BuildSketch(Plane(origin=(0, 0, 626.285), x_dir=(-1, 0, 0), z_dir=(0, 0, -1))):
        with Locations((-1787.3, 19.56128726)):
            Circle(CROQUIS27_R)
    extrude(amount=-CORTAR_EXTRUIR17_DEPTH, mode=Mode.SUBTRACT)

    # Croquis30 → Cortar-Extruir20 (cut)
    with BuildSketch(Plane(origin=(0, -64.345, 0), x_dir=(-1, 0, 0), z_dir=(0, -1, 0))):
        with Locations(Location((-1800, -551.54, 0), (0, 0, 90))):
            Circle(CROQUIS30_R)
        with Locations(Location((-1774.6, -526.14, 0), (0, 0, 90))):
            Circle(CROQUIS30_R)
    extrude(amount=-CORTAR_EXTRUIR20_DEPTH, mode=Mode.SUBTRACT)


with BuildPart() as cortar_extruir15_piece_1:
    # of the separate pieces the step leaves, piece 1, a body of its own (cortar_extruir15_pieces)
    add(cortar_extruir14_piece_1.part.solids().sort_by_distance((-25.4, -58.035, 462.64))[0])

    # Croquis26 → Cortar-Extruir16 (cut)
    with BuildSketch(Plane(origin=(0, -58.035, 0), x_dir=(1, 0, 0), z_dir=(0, 1, 0))):
        with Locations(Location((1787.3, -488.04, 0), (0, 0, 270))):
            Circle(CROQUIS26_R)
    extrude(amount=-CORTAR_EXTRUIR16_DEPTH, mode=Mode.SUBTRACT)

    # Croquis28 → Cortar-Extruir18 (cut)
    with BuildSketch(Plane(origin=(0, -64.345, 0), x_dir=(-1, 0, 0), z_dir=(0, -1, 0))):
        with Locations(Location((-899.999999999, -501.935, 0), (0, 0, 90))):
            Circle(CROQUIS28_R)
        with Locations(Location((-874.599999999, -476.535, 0), (0, 0, 90))):
            Circle(CROQUIS28_R)
    extrude(amount=-CORTAR_EXTRUIR18_DEPTH, mode=Mode.SUBTRACT)

    # Croquis31 → Cortar-Extruir21 (cut)
    with BuildSketch(Plane(origin=(0, -64.345, 0), x_dir=(-1, 0, 0), z_dir=(0, -1, 0))):
        with Locations(Location((-1097.299999999, -488.04, 0), (0, 0, 90))):
            Circle(CROQUIS31_R)
    extrude(amount=-CORTAR_EXTRUIR21_DEPTH, mode=Mode.SUBTRACT)

    # Croquis32 → Cortar-Extruir22 (cut)
    with BuildSketch(Plane(origin=(0, -58.035, 0), x_dir=(1, 0, 0), z_dir=(0, 1, 0))):
        with Locations(Location((0, -488.04, 0), (0, 0, 270))):
            Circle(CROQUIS32_R)
    extrude(amount=-CORTAR_EXTRUIR22_DEPTH, mode=Mode.SUBTRACT)

    # Croquis35 → Cortar-Extruir25 (cut)
    with BuildSketch(Plane(origin=(0, -58.035, 0), x_dir=(1, 0, 0), z_dir=(0, 1, 0))):
        with Locations(Location((1584.418928683, -488.04, 0), (0, 0, 270))):
            Circle(CROQUIS35_R)
        with Locations(Location((1356.137857365, -488.04, 0), (0, 0, 270))):
            Circle(CROQUIS35_R)
        with Locations(Location((668.331786048, -488.04, 0), (0, 0, 270))):
            Circle(CROQUIS35_R)
        with Locations(Location((437.087857365, -488.04, 0), (0, 0, 270))):
            Circle(CROQUIS35_R)
        with Locations(Location((205.843928683, -488.04, 0), (0, 0, 270))):
            Circle(CROQUIS35_R_2)
    extrude(amount=-CORTAR_EXTRUIR25_DEPTH, mode=Mode.SUBTRACT)


with BuildPart() as cortar_extruir15_piece_2:
    # of the separate pieces the step leaves, piece 2, a body of its own (cortar_extruir15_pieces)
    add(cortar_extruir14_piece_1.part.solids().sort_by_distance((-25.4, -58.035, 6.31))[0])

    # Croquis29 → Cortar-Extruir19 (cut)
    with BuildSketch(Plane(origin=(0, -64.345, 0), x_dir=(-1, 0, 0), z_dir=(0, -1, 0))):
        with Locations(Location((12.7, -424.54, 0), (0, 0, 90))):
            Circle(CROQUIS29_R)
        with Locations(Location((-12.7, -449.94, 0), (0, 0, 90))):
            Circle(CROQUIS29_R)
    extrude(amount=-CORTAR_EXTRUIR19_DEPTH, mode=Mode.SUBTRACT)

    # Croquis33 → Cortar-Extruir23 (cut)
    with BuildSketch(Plane(origin=(0, 17.038152429, 31.720281459), x_dir=(1, 0, 0), z_dir=(0, 0.473195323232863, 0.8809575393119389))):
        with Locations(Location((0, 98.119650087, 0), (0, 0, 270))):
            Circle(CROQUIS33_R)
    extrude(amount=-CORTAR_EXTRUIR23_DEPTH, mode=Mode.SUBTRACT)

    # Croquis34 → Cortar-Extruir24 (cut)
    with BuildSketch(Plane.XY.offset(6.31)):
        with Locations((12.7, -27.44)):
            Circle(CROQUIS34_R)
        with Locations((-12.7, 33.75)):
            Circle(CROQUIS34_R_2)
    extrude(amount=-CORTAR_EXTRUIR24_DEPTH, mode=Mode.SUBTRACT)


solid = Compound([cortar_extruir14_piece_2.part, cortar_extruir15_piece_1.part, cortar_extruir15_piece_2.part])
